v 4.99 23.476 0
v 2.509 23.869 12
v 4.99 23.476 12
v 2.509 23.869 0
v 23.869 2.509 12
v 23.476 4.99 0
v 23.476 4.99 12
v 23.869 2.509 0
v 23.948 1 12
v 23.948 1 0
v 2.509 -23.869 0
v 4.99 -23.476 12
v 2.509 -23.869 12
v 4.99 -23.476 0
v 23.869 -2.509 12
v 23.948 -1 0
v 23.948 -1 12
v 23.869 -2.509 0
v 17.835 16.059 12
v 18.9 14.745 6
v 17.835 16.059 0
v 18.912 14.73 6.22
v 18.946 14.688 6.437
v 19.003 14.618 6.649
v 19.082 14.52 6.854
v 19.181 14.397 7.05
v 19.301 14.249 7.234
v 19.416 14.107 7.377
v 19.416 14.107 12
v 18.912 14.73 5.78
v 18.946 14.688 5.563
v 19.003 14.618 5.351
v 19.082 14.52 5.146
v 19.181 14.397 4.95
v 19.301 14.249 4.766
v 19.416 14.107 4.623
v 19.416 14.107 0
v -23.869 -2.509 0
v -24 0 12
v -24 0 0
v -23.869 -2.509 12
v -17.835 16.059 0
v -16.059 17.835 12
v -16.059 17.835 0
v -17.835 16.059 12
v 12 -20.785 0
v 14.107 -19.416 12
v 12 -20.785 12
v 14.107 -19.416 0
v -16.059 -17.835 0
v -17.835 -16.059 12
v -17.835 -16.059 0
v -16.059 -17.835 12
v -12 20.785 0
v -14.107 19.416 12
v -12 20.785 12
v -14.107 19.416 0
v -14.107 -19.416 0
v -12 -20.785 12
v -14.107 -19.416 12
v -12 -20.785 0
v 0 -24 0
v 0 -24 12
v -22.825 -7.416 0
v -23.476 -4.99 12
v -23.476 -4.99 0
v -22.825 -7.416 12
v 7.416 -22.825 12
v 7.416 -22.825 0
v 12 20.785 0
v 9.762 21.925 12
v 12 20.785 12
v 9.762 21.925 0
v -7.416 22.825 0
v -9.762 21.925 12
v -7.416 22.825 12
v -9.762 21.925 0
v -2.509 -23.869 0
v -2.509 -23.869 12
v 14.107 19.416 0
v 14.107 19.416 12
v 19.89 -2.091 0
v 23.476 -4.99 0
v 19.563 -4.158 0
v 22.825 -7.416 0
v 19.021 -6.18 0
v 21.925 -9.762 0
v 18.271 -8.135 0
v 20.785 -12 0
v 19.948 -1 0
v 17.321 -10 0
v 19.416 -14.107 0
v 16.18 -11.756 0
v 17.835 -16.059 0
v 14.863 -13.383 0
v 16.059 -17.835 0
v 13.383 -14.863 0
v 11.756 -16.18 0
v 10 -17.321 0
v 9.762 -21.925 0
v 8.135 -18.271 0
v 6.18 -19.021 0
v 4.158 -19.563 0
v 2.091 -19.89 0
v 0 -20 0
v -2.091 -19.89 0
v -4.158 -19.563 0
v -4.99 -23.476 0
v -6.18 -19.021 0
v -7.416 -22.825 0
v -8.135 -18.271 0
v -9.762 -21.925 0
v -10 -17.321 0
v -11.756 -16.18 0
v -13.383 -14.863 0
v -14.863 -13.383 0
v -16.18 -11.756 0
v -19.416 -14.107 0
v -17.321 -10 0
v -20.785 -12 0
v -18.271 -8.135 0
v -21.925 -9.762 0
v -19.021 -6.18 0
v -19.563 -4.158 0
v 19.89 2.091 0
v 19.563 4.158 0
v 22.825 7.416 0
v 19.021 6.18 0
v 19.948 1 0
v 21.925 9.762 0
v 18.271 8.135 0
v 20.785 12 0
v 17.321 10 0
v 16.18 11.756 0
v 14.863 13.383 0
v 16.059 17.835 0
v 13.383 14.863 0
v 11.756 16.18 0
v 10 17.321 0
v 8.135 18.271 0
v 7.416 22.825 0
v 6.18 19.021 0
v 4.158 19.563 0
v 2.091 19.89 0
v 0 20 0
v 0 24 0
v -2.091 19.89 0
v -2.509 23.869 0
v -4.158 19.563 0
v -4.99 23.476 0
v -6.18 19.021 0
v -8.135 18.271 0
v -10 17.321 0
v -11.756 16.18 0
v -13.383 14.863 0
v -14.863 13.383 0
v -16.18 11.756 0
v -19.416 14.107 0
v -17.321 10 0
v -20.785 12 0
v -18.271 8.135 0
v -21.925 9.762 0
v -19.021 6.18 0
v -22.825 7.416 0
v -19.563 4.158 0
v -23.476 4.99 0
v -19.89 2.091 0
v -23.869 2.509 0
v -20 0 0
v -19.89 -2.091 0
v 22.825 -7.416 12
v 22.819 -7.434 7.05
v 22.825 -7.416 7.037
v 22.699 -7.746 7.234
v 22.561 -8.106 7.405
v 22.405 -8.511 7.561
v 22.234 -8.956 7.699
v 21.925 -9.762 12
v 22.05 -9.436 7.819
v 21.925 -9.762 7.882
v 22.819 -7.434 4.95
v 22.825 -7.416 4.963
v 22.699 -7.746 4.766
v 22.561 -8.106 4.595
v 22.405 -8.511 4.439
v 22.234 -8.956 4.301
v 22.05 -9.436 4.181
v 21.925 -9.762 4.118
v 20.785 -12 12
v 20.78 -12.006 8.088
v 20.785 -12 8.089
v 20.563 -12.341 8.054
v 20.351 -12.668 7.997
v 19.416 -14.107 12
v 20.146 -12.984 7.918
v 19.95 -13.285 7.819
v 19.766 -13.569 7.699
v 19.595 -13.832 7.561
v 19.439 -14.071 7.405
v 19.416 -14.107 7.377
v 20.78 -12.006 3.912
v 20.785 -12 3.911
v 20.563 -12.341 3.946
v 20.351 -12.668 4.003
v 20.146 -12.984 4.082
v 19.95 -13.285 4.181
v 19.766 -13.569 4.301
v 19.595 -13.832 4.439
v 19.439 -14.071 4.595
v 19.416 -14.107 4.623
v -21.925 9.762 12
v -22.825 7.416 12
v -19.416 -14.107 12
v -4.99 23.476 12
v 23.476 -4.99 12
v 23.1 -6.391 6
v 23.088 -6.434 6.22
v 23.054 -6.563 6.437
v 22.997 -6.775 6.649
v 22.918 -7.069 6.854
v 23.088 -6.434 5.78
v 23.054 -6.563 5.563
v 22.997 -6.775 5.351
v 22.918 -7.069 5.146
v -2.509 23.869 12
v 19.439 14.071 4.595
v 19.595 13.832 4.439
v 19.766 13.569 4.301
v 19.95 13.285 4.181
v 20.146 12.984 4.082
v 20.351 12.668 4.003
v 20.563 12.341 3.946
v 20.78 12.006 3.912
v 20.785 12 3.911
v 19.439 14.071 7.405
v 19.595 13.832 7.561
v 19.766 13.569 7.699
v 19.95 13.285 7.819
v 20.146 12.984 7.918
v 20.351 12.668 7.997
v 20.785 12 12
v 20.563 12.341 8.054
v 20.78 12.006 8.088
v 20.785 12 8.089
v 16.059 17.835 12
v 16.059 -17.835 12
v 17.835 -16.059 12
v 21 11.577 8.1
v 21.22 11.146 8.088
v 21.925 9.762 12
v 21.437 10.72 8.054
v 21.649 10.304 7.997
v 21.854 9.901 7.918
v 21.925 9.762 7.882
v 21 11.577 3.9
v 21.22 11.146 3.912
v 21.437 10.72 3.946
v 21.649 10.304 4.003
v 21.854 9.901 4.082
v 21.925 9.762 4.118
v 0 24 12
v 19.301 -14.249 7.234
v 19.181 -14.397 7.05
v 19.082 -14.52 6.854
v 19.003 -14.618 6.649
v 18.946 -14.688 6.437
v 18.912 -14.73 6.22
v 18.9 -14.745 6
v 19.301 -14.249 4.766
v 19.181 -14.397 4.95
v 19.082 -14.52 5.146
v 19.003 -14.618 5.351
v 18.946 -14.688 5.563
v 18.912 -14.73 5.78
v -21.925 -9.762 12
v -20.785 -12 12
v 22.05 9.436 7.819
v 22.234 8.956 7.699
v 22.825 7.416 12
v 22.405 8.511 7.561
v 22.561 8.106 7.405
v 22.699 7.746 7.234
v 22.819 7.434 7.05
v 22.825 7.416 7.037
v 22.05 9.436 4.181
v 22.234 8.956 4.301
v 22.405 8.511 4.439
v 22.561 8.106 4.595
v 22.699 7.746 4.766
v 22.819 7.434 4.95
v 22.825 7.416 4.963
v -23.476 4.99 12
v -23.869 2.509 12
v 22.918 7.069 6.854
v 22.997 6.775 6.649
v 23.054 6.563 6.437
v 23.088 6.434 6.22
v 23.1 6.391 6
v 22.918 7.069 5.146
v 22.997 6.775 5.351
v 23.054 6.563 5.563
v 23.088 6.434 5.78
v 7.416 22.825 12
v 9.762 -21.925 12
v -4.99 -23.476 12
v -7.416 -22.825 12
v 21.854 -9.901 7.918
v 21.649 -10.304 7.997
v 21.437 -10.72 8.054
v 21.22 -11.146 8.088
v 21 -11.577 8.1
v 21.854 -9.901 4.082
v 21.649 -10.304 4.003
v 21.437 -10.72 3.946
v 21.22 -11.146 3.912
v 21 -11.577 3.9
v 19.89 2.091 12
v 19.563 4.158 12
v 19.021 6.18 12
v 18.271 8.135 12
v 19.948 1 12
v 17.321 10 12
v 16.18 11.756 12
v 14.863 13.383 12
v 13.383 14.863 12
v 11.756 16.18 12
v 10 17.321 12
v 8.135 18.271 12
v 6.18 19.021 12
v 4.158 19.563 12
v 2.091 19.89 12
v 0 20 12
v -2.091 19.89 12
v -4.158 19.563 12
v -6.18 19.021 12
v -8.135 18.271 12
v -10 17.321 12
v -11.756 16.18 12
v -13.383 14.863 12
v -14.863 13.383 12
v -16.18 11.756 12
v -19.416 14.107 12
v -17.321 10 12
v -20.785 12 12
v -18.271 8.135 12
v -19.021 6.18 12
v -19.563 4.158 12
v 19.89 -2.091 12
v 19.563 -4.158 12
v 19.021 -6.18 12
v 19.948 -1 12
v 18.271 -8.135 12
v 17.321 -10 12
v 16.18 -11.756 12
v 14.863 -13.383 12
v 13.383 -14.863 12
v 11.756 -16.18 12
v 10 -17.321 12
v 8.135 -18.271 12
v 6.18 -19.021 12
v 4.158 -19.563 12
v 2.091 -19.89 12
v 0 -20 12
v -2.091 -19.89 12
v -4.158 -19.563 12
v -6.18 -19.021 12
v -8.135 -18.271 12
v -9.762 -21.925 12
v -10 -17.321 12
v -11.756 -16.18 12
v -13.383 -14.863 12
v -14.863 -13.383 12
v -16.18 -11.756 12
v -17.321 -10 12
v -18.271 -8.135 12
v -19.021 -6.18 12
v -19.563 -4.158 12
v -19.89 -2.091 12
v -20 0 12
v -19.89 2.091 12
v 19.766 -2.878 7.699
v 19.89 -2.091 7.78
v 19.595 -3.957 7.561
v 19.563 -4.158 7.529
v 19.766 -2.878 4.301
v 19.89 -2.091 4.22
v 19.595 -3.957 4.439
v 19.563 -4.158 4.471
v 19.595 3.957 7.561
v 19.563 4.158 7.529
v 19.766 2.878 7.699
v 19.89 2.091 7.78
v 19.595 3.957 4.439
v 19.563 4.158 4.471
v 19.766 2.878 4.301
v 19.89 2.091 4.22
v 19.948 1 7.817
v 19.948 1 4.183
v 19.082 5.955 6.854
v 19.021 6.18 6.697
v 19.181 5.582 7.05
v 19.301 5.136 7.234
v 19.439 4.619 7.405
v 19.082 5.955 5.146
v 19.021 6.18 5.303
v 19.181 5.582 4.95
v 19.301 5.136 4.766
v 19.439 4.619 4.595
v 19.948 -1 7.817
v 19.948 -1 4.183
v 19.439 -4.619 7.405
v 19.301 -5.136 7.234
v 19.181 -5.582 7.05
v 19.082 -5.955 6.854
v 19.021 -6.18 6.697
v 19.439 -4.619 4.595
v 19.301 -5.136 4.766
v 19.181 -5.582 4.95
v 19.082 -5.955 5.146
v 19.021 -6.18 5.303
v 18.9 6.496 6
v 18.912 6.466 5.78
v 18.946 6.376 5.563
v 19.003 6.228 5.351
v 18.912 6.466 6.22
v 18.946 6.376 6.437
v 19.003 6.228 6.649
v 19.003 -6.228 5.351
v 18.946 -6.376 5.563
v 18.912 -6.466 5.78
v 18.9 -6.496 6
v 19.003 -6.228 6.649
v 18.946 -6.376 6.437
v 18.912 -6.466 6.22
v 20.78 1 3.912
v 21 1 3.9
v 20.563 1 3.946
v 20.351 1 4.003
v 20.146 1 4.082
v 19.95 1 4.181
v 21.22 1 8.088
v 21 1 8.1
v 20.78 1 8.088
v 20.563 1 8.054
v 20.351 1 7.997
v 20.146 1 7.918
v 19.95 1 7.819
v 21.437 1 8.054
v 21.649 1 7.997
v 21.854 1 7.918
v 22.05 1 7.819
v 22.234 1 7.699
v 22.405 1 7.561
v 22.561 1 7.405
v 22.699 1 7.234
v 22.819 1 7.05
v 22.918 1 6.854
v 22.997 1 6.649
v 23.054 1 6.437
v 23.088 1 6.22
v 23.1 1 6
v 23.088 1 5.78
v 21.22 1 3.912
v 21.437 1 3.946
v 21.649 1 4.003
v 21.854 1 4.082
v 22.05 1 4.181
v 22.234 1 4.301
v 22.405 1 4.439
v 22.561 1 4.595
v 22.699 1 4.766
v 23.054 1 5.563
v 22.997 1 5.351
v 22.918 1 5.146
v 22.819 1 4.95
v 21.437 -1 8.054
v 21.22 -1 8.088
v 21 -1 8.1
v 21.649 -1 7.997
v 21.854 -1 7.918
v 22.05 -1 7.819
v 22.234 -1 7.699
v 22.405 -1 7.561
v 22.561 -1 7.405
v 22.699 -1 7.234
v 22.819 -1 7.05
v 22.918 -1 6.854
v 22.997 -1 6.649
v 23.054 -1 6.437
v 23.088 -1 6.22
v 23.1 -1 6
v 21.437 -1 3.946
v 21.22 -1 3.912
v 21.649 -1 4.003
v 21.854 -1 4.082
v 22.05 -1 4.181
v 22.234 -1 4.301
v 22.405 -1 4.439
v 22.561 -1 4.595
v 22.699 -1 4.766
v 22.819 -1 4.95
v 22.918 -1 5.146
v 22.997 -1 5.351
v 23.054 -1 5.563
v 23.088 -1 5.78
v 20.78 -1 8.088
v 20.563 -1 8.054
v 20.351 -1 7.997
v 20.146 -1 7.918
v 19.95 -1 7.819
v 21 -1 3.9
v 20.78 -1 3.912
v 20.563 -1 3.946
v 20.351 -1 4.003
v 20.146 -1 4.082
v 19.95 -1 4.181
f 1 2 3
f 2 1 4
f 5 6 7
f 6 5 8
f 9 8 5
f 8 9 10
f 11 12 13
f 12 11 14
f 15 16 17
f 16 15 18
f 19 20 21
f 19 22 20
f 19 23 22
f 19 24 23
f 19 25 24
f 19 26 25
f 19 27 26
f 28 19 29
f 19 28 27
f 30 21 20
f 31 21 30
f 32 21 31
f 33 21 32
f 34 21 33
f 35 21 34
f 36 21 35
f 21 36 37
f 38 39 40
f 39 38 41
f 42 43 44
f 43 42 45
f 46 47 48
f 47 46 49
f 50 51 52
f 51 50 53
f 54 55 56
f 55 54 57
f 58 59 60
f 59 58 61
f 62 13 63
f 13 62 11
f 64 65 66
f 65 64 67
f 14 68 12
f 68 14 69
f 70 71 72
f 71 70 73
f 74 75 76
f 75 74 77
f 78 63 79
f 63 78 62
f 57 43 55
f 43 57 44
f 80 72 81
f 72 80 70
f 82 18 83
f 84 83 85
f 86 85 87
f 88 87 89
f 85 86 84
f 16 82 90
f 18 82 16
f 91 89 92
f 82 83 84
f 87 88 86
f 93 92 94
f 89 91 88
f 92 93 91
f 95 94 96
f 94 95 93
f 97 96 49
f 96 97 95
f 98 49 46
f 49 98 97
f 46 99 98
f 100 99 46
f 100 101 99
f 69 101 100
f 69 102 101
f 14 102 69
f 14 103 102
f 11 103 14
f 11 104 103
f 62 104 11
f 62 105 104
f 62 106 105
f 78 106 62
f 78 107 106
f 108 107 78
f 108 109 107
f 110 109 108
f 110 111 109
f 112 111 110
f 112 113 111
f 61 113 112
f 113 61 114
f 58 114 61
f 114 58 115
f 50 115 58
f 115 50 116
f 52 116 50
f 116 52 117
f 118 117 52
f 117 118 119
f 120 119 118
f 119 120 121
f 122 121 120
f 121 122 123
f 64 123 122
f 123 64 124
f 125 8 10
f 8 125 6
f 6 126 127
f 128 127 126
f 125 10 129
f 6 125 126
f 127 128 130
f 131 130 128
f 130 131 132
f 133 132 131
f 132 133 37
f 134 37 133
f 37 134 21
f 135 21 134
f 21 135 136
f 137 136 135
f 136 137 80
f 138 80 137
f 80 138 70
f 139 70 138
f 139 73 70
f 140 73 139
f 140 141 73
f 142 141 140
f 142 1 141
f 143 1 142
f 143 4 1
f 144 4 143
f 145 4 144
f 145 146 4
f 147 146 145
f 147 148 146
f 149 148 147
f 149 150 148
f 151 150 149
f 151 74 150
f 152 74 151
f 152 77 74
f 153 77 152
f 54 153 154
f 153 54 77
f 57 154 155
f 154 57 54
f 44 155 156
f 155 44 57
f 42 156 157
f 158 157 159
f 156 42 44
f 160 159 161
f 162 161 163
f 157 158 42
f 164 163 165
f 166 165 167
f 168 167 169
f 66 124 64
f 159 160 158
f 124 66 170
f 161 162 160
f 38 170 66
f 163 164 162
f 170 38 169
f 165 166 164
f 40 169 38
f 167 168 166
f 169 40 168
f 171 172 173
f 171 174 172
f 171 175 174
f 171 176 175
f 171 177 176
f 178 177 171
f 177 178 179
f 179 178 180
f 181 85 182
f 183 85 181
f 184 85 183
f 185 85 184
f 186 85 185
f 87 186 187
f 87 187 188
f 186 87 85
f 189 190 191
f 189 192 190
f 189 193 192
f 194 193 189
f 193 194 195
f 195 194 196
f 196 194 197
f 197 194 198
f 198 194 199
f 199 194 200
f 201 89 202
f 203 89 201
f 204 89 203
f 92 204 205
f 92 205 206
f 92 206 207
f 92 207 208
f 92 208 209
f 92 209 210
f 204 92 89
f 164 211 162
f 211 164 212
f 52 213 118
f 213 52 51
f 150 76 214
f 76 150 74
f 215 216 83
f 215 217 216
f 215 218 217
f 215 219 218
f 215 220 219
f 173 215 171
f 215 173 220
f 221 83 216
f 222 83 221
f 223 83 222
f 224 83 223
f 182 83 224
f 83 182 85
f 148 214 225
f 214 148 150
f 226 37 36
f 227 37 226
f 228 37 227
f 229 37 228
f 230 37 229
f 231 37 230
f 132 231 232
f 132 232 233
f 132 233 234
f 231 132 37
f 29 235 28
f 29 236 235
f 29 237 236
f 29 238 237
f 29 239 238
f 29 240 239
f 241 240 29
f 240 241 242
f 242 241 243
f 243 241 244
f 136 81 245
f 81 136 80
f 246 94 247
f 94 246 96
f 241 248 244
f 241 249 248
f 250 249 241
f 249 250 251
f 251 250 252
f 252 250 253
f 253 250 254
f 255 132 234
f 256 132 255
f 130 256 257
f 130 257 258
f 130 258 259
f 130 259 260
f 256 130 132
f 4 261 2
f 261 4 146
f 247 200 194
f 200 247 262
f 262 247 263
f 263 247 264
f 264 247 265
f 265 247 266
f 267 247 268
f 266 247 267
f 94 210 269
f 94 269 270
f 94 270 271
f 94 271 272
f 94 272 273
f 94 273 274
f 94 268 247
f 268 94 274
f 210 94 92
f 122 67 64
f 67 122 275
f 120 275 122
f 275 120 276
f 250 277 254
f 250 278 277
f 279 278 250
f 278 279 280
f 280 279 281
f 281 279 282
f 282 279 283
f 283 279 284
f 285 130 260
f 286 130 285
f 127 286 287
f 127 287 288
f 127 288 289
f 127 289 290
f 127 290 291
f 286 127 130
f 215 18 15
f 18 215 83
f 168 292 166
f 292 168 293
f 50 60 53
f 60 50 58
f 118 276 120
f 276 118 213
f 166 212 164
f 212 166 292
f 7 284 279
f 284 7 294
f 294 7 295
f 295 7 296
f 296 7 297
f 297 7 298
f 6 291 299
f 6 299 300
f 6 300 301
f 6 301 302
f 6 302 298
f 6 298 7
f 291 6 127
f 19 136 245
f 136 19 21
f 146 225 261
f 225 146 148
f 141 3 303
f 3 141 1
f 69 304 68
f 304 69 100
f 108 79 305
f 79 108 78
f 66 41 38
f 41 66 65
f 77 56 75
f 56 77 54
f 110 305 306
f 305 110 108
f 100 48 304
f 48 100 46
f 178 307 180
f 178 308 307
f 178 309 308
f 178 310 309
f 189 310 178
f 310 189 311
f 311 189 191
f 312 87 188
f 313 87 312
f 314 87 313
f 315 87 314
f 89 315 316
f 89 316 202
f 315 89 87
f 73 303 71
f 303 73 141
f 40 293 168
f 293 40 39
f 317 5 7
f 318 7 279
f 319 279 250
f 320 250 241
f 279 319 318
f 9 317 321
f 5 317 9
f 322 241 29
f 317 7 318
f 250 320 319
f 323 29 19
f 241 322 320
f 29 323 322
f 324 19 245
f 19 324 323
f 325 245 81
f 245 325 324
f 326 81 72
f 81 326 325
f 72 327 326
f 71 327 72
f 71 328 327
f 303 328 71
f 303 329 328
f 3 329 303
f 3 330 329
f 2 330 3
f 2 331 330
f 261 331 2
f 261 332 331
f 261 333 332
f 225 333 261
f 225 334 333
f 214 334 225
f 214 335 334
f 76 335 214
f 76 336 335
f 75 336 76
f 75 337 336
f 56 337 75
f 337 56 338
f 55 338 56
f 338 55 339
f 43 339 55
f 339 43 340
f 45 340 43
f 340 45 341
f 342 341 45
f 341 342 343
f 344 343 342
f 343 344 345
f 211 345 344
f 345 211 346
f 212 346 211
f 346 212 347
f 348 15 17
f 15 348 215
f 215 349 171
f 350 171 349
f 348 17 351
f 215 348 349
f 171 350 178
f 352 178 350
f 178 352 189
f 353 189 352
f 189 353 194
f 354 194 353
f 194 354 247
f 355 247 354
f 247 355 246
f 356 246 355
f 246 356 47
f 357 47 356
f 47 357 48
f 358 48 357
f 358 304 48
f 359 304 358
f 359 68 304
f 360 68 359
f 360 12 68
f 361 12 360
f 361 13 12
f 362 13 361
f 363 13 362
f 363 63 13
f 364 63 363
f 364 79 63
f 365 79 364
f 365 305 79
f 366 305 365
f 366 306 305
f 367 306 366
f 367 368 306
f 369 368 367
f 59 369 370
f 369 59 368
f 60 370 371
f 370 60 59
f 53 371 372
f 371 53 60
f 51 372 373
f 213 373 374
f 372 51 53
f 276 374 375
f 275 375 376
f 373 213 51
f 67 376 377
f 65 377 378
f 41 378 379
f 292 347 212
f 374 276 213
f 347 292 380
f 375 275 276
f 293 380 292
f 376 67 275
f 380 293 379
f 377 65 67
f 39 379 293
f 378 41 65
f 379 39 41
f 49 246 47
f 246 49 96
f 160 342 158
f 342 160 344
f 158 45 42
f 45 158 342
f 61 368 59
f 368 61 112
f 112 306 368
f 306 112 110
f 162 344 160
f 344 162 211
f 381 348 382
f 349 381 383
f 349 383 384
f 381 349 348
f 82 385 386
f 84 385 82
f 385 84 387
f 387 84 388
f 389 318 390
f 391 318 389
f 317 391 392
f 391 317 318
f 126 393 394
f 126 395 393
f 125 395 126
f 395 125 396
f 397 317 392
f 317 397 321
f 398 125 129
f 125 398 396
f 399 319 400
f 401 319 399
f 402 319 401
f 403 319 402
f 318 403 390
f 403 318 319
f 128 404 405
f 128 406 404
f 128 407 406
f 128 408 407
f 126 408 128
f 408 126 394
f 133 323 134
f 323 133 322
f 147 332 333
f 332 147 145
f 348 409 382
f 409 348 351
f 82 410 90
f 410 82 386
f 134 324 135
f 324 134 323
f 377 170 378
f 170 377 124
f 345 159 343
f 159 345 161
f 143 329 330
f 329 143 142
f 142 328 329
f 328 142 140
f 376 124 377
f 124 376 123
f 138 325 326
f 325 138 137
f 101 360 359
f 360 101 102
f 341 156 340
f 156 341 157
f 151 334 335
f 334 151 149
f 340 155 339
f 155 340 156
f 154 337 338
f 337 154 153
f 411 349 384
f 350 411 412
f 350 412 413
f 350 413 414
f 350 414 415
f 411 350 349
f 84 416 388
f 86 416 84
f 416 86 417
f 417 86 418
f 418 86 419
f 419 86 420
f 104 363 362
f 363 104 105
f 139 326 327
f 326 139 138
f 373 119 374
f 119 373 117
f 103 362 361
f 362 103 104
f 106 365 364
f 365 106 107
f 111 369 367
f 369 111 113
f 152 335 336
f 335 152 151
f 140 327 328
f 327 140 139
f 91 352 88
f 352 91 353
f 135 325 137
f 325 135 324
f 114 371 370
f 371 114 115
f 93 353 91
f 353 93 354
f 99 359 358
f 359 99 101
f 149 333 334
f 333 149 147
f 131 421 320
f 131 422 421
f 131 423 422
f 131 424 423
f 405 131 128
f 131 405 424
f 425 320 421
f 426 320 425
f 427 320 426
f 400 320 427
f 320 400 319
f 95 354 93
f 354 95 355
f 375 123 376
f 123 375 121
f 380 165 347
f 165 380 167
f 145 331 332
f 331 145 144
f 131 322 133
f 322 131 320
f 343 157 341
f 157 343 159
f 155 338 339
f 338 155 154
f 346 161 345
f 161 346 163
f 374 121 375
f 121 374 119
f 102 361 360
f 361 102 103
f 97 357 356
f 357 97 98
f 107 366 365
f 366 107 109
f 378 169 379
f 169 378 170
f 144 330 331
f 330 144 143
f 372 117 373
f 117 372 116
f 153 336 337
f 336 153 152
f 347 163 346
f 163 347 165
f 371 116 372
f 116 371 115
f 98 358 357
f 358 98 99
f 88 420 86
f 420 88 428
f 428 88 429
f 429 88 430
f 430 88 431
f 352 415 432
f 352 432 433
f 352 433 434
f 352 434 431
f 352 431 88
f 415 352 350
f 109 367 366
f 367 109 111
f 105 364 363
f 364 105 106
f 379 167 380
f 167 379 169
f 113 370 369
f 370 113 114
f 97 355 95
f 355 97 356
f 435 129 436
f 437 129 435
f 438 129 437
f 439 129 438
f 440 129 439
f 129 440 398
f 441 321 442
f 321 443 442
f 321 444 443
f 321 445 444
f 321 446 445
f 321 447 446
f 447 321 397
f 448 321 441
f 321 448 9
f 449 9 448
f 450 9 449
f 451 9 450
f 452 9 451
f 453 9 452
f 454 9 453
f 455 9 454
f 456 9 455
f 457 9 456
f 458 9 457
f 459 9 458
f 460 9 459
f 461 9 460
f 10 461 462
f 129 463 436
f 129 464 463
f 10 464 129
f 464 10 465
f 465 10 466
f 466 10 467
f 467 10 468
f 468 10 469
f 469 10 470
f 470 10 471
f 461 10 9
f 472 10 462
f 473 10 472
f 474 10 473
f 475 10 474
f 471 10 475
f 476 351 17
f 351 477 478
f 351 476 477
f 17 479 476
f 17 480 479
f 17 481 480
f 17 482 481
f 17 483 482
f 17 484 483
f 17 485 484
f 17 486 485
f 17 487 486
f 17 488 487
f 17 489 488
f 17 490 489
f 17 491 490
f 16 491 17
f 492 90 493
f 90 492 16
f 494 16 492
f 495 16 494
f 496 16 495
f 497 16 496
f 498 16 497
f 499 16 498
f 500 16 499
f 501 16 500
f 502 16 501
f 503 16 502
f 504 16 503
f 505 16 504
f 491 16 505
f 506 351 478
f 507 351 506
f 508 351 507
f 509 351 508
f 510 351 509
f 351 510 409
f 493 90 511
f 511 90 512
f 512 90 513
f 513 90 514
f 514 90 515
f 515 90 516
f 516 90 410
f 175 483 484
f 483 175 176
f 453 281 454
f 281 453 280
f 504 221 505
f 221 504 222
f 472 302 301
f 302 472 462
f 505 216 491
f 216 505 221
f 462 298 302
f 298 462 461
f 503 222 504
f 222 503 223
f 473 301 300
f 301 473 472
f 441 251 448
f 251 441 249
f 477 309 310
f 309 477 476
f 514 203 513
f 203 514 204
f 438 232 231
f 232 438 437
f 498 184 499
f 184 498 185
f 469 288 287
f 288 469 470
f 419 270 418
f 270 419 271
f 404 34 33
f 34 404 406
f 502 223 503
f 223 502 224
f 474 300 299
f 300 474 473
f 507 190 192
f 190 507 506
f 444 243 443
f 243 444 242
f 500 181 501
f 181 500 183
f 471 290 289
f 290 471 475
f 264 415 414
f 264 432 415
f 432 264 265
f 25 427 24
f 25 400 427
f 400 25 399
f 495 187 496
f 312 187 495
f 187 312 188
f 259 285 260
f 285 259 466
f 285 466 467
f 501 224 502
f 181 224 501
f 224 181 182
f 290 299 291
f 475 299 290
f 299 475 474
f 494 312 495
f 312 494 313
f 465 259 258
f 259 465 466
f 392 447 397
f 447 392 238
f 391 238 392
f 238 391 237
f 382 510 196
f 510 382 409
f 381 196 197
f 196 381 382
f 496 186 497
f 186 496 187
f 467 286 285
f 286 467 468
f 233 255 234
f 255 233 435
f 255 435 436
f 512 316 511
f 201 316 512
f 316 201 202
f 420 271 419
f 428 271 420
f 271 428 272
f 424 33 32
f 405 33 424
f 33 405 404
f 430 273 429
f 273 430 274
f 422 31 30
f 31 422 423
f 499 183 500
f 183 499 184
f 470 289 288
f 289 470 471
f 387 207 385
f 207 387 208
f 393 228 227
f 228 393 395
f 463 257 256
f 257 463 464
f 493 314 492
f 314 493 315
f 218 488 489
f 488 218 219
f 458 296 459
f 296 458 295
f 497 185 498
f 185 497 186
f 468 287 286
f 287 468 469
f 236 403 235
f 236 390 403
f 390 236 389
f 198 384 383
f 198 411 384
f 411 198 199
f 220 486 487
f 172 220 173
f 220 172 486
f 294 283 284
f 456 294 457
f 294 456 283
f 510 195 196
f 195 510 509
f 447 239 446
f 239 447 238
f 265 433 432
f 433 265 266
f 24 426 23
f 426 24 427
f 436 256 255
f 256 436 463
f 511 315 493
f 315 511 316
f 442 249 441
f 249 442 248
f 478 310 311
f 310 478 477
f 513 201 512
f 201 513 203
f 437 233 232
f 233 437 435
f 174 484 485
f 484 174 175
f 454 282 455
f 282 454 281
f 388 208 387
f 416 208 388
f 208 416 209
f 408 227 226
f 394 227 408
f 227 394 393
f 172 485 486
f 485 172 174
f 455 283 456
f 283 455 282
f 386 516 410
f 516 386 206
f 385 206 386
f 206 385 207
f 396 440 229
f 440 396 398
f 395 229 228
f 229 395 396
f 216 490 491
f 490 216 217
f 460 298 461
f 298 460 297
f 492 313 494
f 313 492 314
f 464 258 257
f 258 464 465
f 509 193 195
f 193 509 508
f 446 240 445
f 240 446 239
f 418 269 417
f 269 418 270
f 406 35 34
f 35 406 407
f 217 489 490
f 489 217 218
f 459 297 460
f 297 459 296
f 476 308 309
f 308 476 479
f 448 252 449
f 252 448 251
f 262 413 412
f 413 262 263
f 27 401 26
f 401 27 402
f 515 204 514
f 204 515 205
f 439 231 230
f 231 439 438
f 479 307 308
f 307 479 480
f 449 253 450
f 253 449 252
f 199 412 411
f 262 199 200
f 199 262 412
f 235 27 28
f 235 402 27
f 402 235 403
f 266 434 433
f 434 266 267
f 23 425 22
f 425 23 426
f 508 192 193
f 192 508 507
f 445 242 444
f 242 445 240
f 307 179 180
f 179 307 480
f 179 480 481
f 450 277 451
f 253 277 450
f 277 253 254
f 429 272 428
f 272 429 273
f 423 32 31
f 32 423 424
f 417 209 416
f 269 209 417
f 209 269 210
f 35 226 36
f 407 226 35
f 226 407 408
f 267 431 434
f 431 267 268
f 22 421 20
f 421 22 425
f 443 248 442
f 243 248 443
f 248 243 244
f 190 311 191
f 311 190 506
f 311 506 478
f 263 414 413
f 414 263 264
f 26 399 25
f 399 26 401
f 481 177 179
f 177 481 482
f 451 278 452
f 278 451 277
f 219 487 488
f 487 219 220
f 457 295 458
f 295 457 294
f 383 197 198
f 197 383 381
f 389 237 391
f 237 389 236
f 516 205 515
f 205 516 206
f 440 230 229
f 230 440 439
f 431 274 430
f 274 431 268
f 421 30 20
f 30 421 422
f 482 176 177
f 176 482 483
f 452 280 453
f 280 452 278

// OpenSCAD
// C-style pipe clamp.
$fn = 60;
eps = 0.02;
pipe_d = 40;
wall = 4;
outer_d = pipe_d + 2 * wall;
width = 12;
slit = 2;
difference() {
    cylinder(d=outer_d,h=width);
    translate([0,0,-eps]) cylinder(d=pipe_d,h=width+2*eps);
    translate([0,-slit/2,-eps]) cube([outer_d/2+eps,slit,width+2*eps]);
    translate([outer_d/2-3,-outer_d/2-eps,width/2]) rotate([-90,0,0]) cylinder(d=4.2,h=outer_d+2*eps);
}
